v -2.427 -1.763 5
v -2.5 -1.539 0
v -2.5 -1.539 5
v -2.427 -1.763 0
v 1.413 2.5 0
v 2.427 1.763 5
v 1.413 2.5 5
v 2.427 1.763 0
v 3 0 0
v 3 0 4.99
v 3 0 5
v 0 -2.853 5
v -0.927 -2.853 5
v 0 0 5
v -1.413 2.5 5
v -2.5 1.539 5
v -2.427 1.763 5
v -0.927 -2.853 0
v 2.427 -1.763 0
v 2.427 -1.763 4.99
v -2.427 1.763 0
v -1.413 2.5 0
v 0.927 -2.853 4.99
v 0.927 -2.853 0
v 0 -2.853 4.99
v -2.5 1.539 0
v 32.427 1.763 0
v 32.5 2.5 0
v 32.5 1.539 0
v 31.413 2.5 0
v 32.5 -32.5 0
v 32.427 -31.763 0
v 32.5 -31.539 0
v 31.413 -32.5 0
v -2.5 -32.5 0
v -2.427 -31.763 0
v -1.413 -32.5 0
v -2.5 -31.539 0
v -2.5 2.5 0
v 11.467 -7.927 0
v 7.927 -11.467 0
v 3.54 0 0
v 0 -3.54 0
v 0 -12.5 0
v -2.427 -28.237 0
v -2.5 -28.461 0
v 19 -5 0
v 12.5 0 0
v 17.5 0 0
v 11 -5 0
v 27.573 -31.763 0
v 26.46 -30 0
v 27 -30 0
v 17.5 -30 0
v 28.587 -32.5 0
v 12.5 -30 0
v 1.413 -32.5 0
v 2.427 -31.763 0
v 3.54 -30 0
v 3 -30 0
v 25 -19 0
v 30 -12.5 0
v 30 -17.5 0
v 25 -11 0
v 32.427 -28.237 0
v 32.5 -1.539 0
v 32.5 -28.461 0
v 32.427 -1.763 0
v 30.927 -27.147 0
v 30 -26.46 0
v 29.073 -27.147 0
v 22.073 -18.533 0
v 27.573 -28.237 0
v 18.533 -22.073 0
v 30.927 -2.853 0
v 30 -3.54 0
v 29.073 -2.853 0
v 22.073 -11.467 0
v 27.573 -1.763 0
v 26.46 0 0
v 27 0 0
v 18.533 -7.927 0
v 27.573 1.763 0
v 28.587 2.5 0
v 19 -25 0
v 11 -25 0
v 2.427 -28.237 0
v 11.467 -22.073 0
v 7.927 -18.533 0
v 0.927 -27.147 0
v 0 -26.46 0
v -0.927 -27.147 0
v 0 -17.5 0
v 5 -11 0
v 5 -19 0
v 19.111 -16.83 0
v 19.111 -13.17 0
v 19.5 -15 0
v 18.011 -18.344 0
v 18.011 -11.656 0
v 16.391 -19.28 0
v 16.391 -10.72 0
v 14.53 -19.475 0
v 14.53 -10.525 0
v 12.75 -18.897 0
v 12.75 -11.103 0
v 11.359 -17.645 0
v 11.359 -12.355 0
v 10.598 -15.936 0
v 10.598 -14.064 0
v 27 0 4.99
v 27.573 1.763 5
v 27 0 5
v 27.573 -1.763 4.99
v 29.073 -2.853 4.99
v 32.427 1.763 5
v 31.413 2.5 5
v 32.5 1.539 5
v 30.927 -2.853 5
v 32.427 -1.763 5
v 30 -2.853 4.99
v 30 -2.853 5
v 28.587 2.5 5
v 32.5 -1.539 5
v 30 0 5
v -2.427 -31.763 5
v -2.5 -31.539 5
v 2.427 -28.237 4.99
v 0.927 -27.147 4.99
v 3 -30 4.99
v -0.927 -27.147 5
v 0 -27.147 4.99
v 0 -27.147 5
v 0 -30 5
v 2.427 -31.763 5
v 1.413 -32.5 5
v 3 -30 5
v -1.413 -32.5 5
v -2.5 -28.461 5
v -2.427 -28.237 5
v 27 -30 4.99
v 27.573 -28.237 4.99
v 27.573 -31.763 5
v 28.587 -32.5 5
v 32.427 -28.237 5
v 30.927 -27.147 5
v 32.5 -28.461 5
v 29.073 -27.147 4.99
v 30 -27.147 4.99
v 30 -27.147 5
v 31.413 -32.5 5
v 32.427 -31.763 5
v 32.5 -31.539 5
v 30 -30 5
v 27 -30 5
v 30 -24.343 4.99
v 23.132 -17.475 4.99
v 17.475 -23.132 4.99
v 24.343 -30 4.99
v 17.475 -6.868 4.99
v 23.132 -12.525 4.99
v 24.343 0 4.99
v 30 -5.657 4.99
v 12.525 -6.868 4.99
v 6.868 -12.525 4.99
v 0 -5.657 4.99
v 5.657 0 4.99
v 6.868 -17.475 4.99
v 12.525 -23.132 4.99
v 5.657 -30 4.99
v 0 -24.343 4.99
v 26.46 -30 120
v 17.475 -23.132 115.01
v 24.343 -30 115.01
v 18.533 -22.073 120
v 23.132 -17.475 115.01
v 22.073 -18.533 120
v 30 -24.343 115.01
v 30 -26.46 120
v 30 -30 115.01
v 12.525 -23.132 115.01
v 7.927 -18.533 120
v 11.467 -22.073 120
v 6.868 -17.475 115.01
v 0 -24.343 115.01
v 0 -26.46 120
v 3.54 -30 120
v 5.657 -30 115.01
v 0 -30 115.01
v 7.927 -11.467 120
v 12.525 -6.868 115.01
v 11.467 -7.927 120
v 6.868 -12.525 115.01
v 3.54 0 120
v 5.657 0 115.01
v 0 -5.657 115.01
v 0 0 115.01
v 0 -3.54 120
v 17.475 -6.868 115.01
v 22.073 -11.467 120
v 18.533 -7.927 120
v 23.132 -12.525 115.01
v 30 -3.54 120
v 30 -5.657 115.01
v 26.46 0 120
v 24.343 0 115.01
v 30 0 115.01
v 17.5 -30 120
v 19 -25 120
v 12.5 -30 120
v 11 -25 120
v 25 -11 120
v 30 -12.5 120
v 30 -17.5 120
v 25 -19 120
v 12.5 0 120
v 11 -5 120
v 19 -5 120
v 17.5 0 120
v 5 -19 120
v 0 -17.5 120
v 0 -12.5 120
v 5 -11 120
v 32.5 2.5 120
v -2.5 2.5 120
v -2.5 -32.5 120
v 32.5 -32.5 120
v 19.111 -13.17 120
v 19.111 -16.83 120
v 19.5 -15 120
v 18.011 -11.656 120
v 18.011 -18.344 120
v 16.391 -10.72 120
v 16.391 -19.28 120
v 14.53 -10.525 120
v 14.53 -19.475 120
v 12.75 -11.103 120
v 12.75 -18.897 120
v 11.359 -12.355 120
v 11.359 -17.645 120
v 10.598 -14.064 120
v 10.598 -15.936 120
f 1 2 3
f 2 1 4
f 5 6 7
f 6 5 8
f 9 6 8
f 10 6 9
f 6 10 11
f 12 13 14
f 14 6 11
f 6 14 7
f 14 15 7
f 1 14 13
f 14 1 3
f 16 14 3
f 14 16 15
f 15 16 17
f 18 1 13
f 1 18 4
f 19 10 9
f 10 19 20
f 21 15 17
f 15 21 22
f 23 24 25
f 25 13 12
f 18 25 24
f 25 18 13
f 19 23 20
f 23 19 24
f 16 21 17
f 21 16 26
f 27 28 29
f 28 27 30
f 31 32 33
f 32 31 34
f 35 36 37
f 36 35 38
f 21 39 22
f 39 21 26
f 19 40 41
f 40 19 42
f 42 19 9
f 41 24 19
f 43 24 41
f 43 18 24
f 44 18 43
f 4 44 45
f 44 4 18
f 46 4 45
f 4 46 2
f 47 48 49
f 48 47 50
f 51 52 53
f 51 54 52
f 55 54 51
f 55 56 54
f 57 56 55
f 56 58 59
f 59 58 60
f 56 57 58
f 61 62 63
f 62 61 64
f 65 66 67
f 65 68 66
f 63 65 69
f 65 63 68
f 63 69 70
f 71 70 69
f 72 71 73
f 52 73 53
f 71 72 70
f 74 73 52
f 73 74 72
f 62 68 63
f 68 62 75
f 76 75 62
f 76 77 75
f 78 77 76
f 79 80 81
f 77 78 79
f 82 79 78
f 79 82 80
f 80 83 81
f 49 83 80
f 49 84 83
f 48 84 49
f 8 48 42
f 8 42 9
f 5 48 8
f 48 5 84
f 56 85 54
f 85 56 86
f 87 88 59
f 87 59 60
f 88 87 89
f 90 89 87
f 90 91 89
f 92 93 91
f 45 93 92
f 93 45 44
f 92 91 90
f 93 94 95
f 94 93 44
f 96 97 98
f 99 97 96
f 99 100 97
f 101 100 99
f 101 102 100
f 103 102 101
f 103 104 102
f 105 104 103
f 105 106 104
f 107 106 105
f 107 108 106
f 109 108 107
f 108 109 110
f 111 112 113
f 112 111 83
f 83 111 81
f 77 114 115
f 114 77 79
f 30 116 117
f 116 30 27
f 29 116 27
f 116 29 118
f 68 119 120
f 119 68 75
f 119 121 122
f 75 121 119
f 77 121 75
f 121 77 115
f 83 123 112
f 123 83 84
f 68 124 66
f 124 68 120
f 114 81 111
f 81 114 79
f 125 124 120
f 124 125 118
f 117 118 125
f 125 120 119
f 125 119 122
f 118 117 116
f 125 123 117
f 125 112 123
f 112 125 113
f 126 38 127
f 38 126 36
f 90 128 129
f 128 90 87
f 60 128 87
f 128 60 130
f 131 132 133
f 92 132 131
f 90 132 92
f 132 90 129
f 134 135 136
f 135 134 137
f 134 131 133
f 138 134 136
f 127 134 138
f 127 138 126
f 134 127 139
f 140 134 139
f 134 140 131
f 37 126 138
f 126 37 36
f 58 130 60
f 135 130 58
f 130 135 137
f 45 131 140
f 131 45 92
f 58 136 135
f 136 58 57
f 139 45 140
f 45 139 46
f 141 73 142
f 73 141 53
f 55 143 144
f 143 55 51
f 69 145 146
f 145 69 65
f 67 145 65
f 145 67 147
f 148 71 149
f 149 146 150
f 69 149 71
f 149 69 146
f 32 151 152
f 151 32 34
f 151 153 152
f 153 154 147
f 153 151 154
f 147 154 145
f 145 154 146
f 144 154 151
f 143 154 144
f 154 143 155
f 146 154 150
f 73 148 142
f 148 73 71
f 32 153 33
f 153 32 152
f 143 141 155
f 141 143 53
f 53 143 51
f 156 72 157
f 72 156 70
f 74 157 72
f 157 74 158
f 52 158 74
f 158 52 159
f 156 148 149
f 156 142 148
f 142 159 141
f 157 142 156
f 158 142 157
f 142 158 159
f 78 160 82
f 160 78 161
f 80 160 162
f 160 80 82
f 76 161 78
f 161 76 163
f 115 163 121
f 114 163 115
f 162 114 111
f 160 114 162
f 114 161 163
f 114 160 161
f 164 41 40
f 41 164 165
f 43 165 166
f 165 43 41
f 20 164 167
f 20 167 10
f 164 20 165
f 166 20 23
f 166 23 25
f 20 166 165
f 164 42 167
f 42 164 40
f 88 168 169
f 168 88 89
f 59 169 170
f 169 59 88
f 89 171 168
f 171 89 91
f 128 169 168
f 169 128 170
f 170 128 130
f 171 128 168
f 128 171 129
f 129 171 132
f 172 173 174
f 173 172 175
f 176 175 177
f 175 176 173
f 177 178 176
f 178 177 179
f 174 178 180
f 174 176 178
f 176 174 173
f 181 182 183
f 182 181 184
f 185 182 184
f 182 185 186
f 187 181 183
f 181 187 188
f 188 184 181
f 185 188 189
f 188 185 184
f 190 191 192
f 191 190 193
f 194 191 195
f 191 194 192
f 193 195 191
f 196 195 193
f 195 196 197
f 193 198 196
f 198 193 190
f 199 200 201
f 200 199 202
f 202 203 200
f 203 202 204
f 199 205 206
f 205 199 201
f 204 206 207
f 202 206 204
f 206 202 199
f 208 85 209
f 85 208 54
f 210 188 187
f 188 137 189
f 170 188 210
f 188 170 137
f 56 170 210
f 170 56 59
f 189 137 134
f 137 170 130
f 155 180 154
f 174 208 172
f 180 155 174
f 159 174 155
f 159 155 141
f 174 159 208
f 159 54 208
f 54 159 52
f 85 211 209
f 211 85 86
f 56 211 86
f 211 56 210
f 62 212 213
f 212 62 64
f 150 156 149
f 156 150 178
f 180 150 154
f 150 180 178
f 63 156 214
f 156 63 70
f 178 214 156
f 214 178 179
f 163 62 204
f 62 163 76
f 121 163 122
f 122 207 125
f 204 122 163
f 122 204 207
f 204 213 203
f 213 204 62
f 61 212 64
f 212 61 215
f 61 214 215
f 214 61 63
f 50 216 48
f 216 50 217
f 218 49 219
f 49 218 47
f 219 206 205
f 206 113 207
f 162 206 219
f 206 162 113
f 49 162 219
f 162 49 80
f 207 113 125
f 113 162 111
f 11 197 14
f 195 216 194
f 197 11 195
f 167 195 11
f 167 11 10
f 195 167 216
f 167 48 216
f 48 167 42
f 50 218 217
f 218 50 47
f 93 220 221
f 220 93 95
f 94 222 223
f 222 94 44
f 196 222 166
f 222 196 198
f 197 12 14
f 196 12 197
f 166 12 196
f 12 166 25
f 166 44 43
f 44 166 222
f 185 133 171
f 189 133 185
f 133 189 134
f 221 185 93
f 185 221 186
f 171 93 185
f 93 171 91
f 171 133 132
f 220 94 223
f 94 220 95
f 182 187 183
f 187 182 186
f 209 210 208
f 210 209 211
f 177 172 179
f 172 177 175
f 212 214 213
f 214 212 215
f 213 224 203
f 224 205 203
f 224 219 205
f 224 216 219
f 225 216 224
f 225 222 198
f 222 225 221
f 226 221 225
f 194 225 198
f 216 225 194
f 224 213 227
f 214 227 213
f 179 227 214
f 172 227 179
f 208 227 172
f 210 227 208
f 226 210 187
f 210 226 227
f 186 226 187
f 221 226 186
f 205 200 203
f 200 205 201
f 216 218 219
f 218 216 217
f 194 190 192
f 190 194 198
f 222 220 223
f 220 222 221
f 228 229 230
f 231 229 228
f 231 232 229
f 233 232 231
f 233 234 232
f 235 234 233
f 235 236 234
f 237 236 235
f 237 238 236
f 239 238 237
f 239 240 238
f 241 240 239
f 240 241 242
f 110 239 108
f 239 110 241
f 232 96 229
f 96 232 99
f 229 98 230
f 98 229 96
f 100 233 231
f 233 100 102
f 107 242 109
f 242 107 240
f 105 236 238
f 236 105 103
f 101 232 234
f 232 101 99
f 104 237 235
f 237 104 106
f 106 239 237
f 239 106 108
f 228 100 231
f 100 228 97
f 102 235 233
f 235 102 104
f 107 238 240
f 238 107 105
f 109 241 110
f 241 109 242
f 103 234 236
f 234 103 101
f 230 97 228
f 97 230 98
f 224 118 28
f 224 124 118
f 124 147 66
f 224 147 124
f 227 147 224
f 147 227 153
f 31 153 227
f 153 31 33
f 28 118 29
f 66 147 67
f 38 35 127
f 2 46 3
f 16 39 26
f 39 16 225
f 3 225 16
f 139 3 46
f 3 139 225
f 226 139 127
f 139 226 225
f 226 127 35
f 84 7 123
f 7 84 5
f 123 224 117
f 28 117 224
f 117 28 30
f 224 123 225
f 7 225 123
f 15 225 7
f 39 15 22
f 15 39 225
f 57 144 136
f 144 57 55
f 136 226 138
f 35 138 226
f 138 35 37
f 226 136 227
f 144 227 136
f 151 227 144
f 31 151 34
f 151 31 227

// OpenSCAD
// file: ../globals.scad
/*
Most things in this file is represented as one millimeter, so keep that in mind while changing things.
Some of the setting are not mm but at variables that you can set, such as 2*x=2x and you are setting what x is.
I will try to specify when things are variables and not exact measurements.
*/

obj_leg = 30;
leg_length = 5.5;
small_number = 0.001;
metal_core_rode_global = 5;


///////////////// number of holes /////////////////////
z_hole_number = 8;
other_holes = 8;

///////////////// Pins /////////////////////

//pins that poke out
ball_size = 10;
pin_height = 20;
pin_diameter = 6;


//holes
hole_ball_size = ball_size;
hole_pin_height = pin_height;
hole_pin_diameter = pin_diameter;

///////////////// Z THINGS /////////////////////

berring_slot_width = 7.5;
berring_slot_depth = 6.5;
metal_core_rode = 5;

///////////////// X THINGS /////////////////////

//male dove tails
max_width=8;
min_width=5;
depth=5;
height=obj_leg/2;

//female dove tails, this is found on the y mounts
girl_max_width=11;
girl_min_width=5;
girl_depth=5;
girl_height=obj_leg;


///////////////// Y THINGS /////////////////////
/*
The Y is so normal that all of those global variables at the top should change all of the setting in it, this section is set her incase there are variables set in the future development of this project.
*/
// file: ../include.scad
//////////////////      END SECTION       //////////////////

	module added_pins(){
		difference(){
			union(){
				translate([30/(15/4),obj_leg*leg_length,30/(15/4)]) pin();
				translate([30/(15/4)+14.5,obj_leg*leg_length,30/(15/4)+14]) pin();
			}
			union(){
							translate([30/(15/4)+13.5,obj_leg*leg_length-20,30/(15/4)+5])cube(size=[2,40,15]);
							translate([30/(15/4)+7.5,obj_leg*leg_length-20,30/(15/4)+15])rotate([0,90,0]) cube(size=[2,40,15]);	

							translate([30/(15/4)-1,obj_leg*leg_length-20,30/(15/4)-8])cube(size=[2,40,15]);
							translate([30/(15/4)-10,obj_leg*leg_length-20,30/(15/4)+1])rotate([0,90,0]) cube(size=[2,40,15]);
			}
		}
	}
	module taken_pins() {
		translate([30/(15/4)+14,obj_leg*leg_length-10,30/(15/4)]) mirror_pin();
		translate([30/(15/4),obj_leg*leg_length-10,30/(15/4)+15]) mirror_pin();
	}


//////////////////      OTHER STUFF       //////////////////

	module holes() {
		rotate([0,0,90]) for(y=[0:other_holes])
		translate([obj_leg+y*15,-15.5,7.5]) union() {
			translate([7.5,0,15]) hole_up();
			hole_down();
		}
	}
	module extend_holes() {
	module top(){
		rotate([0,0,90]) for(y=[0:other_holes+1])
		translate([(30/4)+y*15,-15.5,7.5]) union() {
			translate([7.5,0,15]) hole_up();
		}
	}
	module bottom(){
		rotate([0,0,90]) for(y=[0:other_holes+2])
		translate([(30/4)+y*15,-15.5,7.5]) union() {
			hole_down();
		
}
	}
	union(){
		top();
		bottom();
	}
	}

	module hole() {
		union() {
			rotate([90, 90, 0]) cylinder(h=40, d=hole_pin_diameter, center=true);
			translate([0,7.5,0]) sphere(d=hole_ball_size);
			translate([0,-6,0]) sphere(d=hole_ball_size);
		}
	}
	module hole_up() {
		union() {
			rotate([90, 90, 0]) cylinder(h=40, d=hole_pin_diameter, center=true);
			translate([0,7.5,10]) cylinder(h=hole_pin_height, d=hole_pin_diameter, center=true);
			translate([0,-6,10]) cylinder(h=hole_pin_height, d=hole_pin_diameter, center=true);
			translate([0,7.5,0]) sphere(d=hole_ball_size);
			translate([0,-6,0]) sphere(d=hole_ball_size);
		}
	}
	module hole_down() {
		union() {
			rotate([90, 90, 0]) cylinder(h=40, d=hole_pin_diameter, center=true);
			translate([0,7.5,-10]) cylinder(h=hole_pin_height, d=hole_pin_diameter, center=true);
			translate([0,-6,-10]) cylinder(h=hole_pin_height, d=hole_pin_diameter, center=true);
			translate([0,7.5,0]) sphere(d=hole_ball_size);
			translate([0,-6,0]) sphere(d=hole_ball_size);
		}
	}
	module pin() {
		union() {
			rotate([90, 90, 0]) cylinder(h=pin_height, d=pin_diameter, center=true);
			translate([0,7.5,0]) sphere(d=ball_size);
		}
	}

	module mirror_pin() {
		rotate([90, 90, 0]) cylinder(h=hole_pin_height+small_number, d=hole_pin_diameter, center=true);
		translate([0,-(pin_height-(ball_size/2)),0]) sphere(d=ball_size);
	}


//////////////////      SOME RACK AND Z THINGS       //////////////////

module z_holes() {
    rotate([0,-90,0]) for(z=[0:z_hole_number])
    translate([22.5+z*15,16,-12])
        hole();
}

module pin_cuts() {
	union(){
		cube(size=[2,10,40], center=true);
		rotate([0,0,90]) cube(size=[2,10,40], center=true);
	}
}
module pin_uncut() {
	union(){
		rotate([0, 0, 90]) cylinder(h=hole_pin_height, d=hole_pin_diameter, center=true);
		translate([0,0,10]) sphere(d=ball_hole);
	}
}


module pin_out() {
	union(){
		rotate([0, 0, 90]) cylinder(h=pin_height, d=pin_diameter, center=true);
		translate([0,0,10]) sphere(d= ball_size);
	}
}


module pins_z(){
	difference() {
		pin_out();
		pin_cuts();
	}
}
//////////////////      RACK AND SLIDE     ///////////////////

module straight_pins() {
	for(z=[0:((((obj_leg*leg_length)*2)-(obj_leg*2))/3)/14.5]) rotate([-90,0,0]) translate([z*15,30/(15/4),14]) pins_z();
	for(z=[0:((((obj_leg*leg_length)*2)-(obj_leg*2))/3)/14.5]) rotate([-90,0,0]) translate([z*15,30/(15/4)-14,14]) pins_z();
}
module stagger_pins() {
	for(z=[0:((((obj_leg*leg_length)*2)-(obj_leg*2))/3)/14.5]) rotate([-90,0,0]) translate([z*15,30/(15/4),14]) pins_z();
	for(z=[0:((((obj_leg*leg_length)*2)-(obj_leg*2))/3)/14.5]) rotate([-90,0,0]) translate([z*15+7,30/(15/4)-14,14]) pins_z();
}


//////////////////      DOVE TAIL       //////////////////

module male_dovetail(height) {
	dovetail_3d(max_width,min_width,depth,height);
}

module dovetail_3d(max_width=11, min_width=5, depth=5, height=30) {
	linear_extrude(height=height, convexity=2)
		dovetail_2d(max_width,min_width,depth);
}

module dovetail_2d(max_width=11, min_width=5, depth=5) {
	angle=atan((max_width/2-min_width/2)/depth);
	echo("angle: ", angle);
	polygon(paths=[[0,1,2,3,0]], points=[[-min_width/2,0], [-max_width/2,depth], [max_width/2, depth], [min_width/2,0]]);
}

//bow tie
	module tie_end(height){
				rotate([0,0,0]) translate([0,-0.01,((obj_leg/2)/2)]) male_dovetail(height);
				rotate([0,90,0]) translate([0,-0.01,((obj_leg/2)/2)]) male_dovetail(height);
				rotate([0,180,0]) translate([0,-0.01,((obj_leg/2)/2)]) male_dovetail(height);
				rotate([0,-90,0]) translate([0,-0.01,((obj_leg/2)/2)]) male_dovetail(height);
	}

module bow_support(){
	difference(){
		intersection(){
			translate([-15,0,-15]) cube([30,9,30]);
			scale([1.05,1.05,1.05]) rotate([0,45,0]) tie_end();
		}
		cube([29.2,29.2,29.2], center=true);
	}
}

	module wrap(){
		depth = 30;
				translate([-15,30,15]) rotate([90,180,90]) male_dovetail(height=depth);
				rotate([0,90,0]) translate([-15,30,15]) rotate([90,180,90]) male_dovetail(height=depth);
				rotate([0,180,0]) translate([-15,30,15]) rotate([90,180,90]) male_dovetail(height=depth);
				rotate([0,-90,0]) translate([-15,30,15]) rotate([90,180,90]) male_dovetail(height=depth);
	}
// file: ../extention.scad
include <include.scad>;
include <globals.scad>;
metal_rod_size = 9;
support = true;
//min number of units is 2
//max is however large your printer can print
units = 4;

module extention(){
	
	module added(){
			translate([0,0,0]) cube([30,30*units,30]);
	}

	module subtracted(){
	translate([15,0,15]) rotate([0,45,0]) tie_end();
	translate([15,units*30,15]) rotate([0,45,0]) rotate([0,0,180]) tie_end();
	translate([15,15,15]) rotate([90,0,0]) cylinder(h=5000, d= metal_rod_size, center=true);

	for (y = [-1:units-2]) // two iterations, z = -1, z = 1
	{
			translate([15, (y*30)+15, 15]){
			for (r = [0:4]) // two iterations, z = -1, z = 1
			{
				rotate([0,r*90,0]) translate([0,15,15]) rotate([-90,0,0])male_dovetail(height=30);
			}
		}
	}

	} //subtracted
	difference(){
		added();
		subtracted();
	}	
} //module extention

//support
if (support==true)
{
	translate([0,0,5/2]) cylinder(h=5, d=6, center=true);
	translate([30,0,5/2]) cylinder(h=5, d=6, center=true);
	translate([0,-30,5/2]) cylinder(h=5, d=6, center=true);
	translate([30,-30,5/2]) cylinder(h=5, d=6, center=true);
}

module extention_finished(){
		rotate([90,0,0]) extention();
}

extention_finished();
// main file
module extention(){
	include <../extention.scad>;
}

difference(){
	translate([-2.5,-32.5,0]) cube([35,35,30*4]);
	extention();
}
